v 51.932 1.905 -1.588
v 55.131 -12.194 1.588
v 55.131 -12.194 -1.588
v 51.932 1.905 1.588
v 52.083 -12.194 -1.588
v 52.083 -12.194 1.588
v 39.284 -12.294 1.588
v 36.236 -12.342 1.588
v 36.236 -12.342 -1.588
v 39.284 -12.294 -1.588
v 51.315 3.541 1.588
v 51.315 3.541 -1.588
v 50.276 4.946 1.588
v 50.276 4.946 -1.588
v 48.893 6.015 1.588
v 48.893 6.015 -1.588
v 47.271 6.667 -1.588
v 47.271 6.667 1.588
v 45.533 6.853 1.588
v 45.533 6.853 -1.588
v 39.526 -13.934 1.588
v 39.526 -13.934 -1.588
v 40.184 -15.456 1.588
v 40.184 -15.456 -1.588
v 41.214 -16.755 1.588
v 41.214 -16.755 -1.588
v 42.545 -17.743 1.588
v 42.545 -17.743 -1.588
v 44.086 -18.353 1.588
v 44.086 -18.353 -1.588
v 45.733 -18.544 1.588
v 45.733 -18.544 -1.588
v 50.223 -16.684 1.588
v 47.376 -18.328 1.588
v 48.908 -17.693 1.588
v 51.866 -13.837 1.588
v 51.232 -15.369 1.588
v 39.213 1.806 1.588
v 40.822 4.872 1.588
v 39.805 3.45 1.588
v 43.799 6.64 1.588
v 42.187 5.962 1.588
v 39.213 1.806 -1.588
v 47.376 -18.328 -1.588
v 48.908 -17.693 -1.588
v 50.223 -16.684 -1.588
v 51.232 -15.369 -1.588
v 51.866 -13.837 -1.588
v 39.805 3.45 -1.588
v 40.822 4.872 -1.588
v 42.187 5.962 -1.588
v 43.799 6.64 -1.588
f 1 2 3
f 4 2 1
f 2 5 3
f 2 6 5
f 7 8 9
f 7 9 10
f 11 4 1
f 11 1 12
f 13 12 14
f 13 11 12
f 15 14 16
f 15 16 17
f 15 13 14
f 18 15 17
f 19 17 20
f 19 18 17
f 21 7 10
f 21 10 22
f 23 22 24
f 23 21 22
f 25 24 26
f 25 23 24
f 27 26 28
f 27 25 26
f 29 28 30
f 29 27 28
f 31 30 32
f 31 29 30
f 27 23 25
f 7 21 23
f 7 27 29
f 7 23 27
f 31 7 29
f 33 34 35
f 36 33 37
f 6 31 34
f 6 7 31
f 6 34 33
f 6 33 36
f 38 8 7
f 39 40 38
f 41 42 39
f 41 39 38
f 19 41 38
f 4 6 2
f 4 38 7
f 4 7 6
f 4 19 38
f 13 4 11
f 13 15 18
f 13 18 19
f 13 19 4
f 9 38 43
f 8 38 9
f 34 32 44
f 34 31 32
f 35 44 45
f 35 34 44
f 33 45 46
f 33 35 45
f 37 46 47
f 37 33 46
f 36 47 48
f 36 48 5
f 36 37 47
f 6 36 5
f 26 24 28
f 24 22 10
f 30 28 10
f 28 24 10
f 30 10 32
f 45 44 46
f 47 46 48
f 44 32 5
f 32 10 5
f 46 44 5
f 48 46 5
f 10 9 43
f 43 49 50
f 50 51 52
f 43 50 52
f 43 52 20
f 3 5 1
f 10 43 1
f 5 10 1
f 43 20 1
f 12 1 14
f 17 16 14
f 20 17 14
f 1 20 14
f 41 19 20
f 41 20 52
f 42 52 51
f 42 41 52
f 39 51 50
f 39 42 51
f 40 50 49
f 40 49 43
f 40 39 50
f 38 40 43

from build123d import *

# Parameters (mm, degrees)
BOSS_EXTRUDE1_DEPTH = 1.5875


with BuildPart() as part:
    # Sketch2 → Boss-Extrude1 (new, symmetric)
    with BuildSketch(Plane.XY):
        with BuildLine():
            Line((55.130521201, -12.193939448), (51.93209544, 1.905344025))
            ThreePointArc((51.93209544, 1.905344025), (49.621085039, 5.5280528), (45.533364229, 6.85294016))
            ThreePointArc((45.533364229, 6.85294016), (41.466923822, 5.464109588), (39.213011171, 1.80560365))
            Line((39.213011171, 1.80560365), (36.236092368, -12.342105573))
            Line((36.236092368, -12.342105573), (39.283717526, -12.294304966))
            ThreePointArc((39.283717526, -12.294304966), (41.213777682, -16.754713179), (45.732521201, -18.543939448))
            ThreePointArc((45.732521201, -18.543939448), (50.222649262, -16.684067509), (52.082521201, -12.193939448))
            Line((52.082521201, -12.193939448), (55.130521201, -12.193939448))
        make_face()
    extrude(amount=BOSS_EXTRUDE1_DEPTH, both=True)


solid = part.part
